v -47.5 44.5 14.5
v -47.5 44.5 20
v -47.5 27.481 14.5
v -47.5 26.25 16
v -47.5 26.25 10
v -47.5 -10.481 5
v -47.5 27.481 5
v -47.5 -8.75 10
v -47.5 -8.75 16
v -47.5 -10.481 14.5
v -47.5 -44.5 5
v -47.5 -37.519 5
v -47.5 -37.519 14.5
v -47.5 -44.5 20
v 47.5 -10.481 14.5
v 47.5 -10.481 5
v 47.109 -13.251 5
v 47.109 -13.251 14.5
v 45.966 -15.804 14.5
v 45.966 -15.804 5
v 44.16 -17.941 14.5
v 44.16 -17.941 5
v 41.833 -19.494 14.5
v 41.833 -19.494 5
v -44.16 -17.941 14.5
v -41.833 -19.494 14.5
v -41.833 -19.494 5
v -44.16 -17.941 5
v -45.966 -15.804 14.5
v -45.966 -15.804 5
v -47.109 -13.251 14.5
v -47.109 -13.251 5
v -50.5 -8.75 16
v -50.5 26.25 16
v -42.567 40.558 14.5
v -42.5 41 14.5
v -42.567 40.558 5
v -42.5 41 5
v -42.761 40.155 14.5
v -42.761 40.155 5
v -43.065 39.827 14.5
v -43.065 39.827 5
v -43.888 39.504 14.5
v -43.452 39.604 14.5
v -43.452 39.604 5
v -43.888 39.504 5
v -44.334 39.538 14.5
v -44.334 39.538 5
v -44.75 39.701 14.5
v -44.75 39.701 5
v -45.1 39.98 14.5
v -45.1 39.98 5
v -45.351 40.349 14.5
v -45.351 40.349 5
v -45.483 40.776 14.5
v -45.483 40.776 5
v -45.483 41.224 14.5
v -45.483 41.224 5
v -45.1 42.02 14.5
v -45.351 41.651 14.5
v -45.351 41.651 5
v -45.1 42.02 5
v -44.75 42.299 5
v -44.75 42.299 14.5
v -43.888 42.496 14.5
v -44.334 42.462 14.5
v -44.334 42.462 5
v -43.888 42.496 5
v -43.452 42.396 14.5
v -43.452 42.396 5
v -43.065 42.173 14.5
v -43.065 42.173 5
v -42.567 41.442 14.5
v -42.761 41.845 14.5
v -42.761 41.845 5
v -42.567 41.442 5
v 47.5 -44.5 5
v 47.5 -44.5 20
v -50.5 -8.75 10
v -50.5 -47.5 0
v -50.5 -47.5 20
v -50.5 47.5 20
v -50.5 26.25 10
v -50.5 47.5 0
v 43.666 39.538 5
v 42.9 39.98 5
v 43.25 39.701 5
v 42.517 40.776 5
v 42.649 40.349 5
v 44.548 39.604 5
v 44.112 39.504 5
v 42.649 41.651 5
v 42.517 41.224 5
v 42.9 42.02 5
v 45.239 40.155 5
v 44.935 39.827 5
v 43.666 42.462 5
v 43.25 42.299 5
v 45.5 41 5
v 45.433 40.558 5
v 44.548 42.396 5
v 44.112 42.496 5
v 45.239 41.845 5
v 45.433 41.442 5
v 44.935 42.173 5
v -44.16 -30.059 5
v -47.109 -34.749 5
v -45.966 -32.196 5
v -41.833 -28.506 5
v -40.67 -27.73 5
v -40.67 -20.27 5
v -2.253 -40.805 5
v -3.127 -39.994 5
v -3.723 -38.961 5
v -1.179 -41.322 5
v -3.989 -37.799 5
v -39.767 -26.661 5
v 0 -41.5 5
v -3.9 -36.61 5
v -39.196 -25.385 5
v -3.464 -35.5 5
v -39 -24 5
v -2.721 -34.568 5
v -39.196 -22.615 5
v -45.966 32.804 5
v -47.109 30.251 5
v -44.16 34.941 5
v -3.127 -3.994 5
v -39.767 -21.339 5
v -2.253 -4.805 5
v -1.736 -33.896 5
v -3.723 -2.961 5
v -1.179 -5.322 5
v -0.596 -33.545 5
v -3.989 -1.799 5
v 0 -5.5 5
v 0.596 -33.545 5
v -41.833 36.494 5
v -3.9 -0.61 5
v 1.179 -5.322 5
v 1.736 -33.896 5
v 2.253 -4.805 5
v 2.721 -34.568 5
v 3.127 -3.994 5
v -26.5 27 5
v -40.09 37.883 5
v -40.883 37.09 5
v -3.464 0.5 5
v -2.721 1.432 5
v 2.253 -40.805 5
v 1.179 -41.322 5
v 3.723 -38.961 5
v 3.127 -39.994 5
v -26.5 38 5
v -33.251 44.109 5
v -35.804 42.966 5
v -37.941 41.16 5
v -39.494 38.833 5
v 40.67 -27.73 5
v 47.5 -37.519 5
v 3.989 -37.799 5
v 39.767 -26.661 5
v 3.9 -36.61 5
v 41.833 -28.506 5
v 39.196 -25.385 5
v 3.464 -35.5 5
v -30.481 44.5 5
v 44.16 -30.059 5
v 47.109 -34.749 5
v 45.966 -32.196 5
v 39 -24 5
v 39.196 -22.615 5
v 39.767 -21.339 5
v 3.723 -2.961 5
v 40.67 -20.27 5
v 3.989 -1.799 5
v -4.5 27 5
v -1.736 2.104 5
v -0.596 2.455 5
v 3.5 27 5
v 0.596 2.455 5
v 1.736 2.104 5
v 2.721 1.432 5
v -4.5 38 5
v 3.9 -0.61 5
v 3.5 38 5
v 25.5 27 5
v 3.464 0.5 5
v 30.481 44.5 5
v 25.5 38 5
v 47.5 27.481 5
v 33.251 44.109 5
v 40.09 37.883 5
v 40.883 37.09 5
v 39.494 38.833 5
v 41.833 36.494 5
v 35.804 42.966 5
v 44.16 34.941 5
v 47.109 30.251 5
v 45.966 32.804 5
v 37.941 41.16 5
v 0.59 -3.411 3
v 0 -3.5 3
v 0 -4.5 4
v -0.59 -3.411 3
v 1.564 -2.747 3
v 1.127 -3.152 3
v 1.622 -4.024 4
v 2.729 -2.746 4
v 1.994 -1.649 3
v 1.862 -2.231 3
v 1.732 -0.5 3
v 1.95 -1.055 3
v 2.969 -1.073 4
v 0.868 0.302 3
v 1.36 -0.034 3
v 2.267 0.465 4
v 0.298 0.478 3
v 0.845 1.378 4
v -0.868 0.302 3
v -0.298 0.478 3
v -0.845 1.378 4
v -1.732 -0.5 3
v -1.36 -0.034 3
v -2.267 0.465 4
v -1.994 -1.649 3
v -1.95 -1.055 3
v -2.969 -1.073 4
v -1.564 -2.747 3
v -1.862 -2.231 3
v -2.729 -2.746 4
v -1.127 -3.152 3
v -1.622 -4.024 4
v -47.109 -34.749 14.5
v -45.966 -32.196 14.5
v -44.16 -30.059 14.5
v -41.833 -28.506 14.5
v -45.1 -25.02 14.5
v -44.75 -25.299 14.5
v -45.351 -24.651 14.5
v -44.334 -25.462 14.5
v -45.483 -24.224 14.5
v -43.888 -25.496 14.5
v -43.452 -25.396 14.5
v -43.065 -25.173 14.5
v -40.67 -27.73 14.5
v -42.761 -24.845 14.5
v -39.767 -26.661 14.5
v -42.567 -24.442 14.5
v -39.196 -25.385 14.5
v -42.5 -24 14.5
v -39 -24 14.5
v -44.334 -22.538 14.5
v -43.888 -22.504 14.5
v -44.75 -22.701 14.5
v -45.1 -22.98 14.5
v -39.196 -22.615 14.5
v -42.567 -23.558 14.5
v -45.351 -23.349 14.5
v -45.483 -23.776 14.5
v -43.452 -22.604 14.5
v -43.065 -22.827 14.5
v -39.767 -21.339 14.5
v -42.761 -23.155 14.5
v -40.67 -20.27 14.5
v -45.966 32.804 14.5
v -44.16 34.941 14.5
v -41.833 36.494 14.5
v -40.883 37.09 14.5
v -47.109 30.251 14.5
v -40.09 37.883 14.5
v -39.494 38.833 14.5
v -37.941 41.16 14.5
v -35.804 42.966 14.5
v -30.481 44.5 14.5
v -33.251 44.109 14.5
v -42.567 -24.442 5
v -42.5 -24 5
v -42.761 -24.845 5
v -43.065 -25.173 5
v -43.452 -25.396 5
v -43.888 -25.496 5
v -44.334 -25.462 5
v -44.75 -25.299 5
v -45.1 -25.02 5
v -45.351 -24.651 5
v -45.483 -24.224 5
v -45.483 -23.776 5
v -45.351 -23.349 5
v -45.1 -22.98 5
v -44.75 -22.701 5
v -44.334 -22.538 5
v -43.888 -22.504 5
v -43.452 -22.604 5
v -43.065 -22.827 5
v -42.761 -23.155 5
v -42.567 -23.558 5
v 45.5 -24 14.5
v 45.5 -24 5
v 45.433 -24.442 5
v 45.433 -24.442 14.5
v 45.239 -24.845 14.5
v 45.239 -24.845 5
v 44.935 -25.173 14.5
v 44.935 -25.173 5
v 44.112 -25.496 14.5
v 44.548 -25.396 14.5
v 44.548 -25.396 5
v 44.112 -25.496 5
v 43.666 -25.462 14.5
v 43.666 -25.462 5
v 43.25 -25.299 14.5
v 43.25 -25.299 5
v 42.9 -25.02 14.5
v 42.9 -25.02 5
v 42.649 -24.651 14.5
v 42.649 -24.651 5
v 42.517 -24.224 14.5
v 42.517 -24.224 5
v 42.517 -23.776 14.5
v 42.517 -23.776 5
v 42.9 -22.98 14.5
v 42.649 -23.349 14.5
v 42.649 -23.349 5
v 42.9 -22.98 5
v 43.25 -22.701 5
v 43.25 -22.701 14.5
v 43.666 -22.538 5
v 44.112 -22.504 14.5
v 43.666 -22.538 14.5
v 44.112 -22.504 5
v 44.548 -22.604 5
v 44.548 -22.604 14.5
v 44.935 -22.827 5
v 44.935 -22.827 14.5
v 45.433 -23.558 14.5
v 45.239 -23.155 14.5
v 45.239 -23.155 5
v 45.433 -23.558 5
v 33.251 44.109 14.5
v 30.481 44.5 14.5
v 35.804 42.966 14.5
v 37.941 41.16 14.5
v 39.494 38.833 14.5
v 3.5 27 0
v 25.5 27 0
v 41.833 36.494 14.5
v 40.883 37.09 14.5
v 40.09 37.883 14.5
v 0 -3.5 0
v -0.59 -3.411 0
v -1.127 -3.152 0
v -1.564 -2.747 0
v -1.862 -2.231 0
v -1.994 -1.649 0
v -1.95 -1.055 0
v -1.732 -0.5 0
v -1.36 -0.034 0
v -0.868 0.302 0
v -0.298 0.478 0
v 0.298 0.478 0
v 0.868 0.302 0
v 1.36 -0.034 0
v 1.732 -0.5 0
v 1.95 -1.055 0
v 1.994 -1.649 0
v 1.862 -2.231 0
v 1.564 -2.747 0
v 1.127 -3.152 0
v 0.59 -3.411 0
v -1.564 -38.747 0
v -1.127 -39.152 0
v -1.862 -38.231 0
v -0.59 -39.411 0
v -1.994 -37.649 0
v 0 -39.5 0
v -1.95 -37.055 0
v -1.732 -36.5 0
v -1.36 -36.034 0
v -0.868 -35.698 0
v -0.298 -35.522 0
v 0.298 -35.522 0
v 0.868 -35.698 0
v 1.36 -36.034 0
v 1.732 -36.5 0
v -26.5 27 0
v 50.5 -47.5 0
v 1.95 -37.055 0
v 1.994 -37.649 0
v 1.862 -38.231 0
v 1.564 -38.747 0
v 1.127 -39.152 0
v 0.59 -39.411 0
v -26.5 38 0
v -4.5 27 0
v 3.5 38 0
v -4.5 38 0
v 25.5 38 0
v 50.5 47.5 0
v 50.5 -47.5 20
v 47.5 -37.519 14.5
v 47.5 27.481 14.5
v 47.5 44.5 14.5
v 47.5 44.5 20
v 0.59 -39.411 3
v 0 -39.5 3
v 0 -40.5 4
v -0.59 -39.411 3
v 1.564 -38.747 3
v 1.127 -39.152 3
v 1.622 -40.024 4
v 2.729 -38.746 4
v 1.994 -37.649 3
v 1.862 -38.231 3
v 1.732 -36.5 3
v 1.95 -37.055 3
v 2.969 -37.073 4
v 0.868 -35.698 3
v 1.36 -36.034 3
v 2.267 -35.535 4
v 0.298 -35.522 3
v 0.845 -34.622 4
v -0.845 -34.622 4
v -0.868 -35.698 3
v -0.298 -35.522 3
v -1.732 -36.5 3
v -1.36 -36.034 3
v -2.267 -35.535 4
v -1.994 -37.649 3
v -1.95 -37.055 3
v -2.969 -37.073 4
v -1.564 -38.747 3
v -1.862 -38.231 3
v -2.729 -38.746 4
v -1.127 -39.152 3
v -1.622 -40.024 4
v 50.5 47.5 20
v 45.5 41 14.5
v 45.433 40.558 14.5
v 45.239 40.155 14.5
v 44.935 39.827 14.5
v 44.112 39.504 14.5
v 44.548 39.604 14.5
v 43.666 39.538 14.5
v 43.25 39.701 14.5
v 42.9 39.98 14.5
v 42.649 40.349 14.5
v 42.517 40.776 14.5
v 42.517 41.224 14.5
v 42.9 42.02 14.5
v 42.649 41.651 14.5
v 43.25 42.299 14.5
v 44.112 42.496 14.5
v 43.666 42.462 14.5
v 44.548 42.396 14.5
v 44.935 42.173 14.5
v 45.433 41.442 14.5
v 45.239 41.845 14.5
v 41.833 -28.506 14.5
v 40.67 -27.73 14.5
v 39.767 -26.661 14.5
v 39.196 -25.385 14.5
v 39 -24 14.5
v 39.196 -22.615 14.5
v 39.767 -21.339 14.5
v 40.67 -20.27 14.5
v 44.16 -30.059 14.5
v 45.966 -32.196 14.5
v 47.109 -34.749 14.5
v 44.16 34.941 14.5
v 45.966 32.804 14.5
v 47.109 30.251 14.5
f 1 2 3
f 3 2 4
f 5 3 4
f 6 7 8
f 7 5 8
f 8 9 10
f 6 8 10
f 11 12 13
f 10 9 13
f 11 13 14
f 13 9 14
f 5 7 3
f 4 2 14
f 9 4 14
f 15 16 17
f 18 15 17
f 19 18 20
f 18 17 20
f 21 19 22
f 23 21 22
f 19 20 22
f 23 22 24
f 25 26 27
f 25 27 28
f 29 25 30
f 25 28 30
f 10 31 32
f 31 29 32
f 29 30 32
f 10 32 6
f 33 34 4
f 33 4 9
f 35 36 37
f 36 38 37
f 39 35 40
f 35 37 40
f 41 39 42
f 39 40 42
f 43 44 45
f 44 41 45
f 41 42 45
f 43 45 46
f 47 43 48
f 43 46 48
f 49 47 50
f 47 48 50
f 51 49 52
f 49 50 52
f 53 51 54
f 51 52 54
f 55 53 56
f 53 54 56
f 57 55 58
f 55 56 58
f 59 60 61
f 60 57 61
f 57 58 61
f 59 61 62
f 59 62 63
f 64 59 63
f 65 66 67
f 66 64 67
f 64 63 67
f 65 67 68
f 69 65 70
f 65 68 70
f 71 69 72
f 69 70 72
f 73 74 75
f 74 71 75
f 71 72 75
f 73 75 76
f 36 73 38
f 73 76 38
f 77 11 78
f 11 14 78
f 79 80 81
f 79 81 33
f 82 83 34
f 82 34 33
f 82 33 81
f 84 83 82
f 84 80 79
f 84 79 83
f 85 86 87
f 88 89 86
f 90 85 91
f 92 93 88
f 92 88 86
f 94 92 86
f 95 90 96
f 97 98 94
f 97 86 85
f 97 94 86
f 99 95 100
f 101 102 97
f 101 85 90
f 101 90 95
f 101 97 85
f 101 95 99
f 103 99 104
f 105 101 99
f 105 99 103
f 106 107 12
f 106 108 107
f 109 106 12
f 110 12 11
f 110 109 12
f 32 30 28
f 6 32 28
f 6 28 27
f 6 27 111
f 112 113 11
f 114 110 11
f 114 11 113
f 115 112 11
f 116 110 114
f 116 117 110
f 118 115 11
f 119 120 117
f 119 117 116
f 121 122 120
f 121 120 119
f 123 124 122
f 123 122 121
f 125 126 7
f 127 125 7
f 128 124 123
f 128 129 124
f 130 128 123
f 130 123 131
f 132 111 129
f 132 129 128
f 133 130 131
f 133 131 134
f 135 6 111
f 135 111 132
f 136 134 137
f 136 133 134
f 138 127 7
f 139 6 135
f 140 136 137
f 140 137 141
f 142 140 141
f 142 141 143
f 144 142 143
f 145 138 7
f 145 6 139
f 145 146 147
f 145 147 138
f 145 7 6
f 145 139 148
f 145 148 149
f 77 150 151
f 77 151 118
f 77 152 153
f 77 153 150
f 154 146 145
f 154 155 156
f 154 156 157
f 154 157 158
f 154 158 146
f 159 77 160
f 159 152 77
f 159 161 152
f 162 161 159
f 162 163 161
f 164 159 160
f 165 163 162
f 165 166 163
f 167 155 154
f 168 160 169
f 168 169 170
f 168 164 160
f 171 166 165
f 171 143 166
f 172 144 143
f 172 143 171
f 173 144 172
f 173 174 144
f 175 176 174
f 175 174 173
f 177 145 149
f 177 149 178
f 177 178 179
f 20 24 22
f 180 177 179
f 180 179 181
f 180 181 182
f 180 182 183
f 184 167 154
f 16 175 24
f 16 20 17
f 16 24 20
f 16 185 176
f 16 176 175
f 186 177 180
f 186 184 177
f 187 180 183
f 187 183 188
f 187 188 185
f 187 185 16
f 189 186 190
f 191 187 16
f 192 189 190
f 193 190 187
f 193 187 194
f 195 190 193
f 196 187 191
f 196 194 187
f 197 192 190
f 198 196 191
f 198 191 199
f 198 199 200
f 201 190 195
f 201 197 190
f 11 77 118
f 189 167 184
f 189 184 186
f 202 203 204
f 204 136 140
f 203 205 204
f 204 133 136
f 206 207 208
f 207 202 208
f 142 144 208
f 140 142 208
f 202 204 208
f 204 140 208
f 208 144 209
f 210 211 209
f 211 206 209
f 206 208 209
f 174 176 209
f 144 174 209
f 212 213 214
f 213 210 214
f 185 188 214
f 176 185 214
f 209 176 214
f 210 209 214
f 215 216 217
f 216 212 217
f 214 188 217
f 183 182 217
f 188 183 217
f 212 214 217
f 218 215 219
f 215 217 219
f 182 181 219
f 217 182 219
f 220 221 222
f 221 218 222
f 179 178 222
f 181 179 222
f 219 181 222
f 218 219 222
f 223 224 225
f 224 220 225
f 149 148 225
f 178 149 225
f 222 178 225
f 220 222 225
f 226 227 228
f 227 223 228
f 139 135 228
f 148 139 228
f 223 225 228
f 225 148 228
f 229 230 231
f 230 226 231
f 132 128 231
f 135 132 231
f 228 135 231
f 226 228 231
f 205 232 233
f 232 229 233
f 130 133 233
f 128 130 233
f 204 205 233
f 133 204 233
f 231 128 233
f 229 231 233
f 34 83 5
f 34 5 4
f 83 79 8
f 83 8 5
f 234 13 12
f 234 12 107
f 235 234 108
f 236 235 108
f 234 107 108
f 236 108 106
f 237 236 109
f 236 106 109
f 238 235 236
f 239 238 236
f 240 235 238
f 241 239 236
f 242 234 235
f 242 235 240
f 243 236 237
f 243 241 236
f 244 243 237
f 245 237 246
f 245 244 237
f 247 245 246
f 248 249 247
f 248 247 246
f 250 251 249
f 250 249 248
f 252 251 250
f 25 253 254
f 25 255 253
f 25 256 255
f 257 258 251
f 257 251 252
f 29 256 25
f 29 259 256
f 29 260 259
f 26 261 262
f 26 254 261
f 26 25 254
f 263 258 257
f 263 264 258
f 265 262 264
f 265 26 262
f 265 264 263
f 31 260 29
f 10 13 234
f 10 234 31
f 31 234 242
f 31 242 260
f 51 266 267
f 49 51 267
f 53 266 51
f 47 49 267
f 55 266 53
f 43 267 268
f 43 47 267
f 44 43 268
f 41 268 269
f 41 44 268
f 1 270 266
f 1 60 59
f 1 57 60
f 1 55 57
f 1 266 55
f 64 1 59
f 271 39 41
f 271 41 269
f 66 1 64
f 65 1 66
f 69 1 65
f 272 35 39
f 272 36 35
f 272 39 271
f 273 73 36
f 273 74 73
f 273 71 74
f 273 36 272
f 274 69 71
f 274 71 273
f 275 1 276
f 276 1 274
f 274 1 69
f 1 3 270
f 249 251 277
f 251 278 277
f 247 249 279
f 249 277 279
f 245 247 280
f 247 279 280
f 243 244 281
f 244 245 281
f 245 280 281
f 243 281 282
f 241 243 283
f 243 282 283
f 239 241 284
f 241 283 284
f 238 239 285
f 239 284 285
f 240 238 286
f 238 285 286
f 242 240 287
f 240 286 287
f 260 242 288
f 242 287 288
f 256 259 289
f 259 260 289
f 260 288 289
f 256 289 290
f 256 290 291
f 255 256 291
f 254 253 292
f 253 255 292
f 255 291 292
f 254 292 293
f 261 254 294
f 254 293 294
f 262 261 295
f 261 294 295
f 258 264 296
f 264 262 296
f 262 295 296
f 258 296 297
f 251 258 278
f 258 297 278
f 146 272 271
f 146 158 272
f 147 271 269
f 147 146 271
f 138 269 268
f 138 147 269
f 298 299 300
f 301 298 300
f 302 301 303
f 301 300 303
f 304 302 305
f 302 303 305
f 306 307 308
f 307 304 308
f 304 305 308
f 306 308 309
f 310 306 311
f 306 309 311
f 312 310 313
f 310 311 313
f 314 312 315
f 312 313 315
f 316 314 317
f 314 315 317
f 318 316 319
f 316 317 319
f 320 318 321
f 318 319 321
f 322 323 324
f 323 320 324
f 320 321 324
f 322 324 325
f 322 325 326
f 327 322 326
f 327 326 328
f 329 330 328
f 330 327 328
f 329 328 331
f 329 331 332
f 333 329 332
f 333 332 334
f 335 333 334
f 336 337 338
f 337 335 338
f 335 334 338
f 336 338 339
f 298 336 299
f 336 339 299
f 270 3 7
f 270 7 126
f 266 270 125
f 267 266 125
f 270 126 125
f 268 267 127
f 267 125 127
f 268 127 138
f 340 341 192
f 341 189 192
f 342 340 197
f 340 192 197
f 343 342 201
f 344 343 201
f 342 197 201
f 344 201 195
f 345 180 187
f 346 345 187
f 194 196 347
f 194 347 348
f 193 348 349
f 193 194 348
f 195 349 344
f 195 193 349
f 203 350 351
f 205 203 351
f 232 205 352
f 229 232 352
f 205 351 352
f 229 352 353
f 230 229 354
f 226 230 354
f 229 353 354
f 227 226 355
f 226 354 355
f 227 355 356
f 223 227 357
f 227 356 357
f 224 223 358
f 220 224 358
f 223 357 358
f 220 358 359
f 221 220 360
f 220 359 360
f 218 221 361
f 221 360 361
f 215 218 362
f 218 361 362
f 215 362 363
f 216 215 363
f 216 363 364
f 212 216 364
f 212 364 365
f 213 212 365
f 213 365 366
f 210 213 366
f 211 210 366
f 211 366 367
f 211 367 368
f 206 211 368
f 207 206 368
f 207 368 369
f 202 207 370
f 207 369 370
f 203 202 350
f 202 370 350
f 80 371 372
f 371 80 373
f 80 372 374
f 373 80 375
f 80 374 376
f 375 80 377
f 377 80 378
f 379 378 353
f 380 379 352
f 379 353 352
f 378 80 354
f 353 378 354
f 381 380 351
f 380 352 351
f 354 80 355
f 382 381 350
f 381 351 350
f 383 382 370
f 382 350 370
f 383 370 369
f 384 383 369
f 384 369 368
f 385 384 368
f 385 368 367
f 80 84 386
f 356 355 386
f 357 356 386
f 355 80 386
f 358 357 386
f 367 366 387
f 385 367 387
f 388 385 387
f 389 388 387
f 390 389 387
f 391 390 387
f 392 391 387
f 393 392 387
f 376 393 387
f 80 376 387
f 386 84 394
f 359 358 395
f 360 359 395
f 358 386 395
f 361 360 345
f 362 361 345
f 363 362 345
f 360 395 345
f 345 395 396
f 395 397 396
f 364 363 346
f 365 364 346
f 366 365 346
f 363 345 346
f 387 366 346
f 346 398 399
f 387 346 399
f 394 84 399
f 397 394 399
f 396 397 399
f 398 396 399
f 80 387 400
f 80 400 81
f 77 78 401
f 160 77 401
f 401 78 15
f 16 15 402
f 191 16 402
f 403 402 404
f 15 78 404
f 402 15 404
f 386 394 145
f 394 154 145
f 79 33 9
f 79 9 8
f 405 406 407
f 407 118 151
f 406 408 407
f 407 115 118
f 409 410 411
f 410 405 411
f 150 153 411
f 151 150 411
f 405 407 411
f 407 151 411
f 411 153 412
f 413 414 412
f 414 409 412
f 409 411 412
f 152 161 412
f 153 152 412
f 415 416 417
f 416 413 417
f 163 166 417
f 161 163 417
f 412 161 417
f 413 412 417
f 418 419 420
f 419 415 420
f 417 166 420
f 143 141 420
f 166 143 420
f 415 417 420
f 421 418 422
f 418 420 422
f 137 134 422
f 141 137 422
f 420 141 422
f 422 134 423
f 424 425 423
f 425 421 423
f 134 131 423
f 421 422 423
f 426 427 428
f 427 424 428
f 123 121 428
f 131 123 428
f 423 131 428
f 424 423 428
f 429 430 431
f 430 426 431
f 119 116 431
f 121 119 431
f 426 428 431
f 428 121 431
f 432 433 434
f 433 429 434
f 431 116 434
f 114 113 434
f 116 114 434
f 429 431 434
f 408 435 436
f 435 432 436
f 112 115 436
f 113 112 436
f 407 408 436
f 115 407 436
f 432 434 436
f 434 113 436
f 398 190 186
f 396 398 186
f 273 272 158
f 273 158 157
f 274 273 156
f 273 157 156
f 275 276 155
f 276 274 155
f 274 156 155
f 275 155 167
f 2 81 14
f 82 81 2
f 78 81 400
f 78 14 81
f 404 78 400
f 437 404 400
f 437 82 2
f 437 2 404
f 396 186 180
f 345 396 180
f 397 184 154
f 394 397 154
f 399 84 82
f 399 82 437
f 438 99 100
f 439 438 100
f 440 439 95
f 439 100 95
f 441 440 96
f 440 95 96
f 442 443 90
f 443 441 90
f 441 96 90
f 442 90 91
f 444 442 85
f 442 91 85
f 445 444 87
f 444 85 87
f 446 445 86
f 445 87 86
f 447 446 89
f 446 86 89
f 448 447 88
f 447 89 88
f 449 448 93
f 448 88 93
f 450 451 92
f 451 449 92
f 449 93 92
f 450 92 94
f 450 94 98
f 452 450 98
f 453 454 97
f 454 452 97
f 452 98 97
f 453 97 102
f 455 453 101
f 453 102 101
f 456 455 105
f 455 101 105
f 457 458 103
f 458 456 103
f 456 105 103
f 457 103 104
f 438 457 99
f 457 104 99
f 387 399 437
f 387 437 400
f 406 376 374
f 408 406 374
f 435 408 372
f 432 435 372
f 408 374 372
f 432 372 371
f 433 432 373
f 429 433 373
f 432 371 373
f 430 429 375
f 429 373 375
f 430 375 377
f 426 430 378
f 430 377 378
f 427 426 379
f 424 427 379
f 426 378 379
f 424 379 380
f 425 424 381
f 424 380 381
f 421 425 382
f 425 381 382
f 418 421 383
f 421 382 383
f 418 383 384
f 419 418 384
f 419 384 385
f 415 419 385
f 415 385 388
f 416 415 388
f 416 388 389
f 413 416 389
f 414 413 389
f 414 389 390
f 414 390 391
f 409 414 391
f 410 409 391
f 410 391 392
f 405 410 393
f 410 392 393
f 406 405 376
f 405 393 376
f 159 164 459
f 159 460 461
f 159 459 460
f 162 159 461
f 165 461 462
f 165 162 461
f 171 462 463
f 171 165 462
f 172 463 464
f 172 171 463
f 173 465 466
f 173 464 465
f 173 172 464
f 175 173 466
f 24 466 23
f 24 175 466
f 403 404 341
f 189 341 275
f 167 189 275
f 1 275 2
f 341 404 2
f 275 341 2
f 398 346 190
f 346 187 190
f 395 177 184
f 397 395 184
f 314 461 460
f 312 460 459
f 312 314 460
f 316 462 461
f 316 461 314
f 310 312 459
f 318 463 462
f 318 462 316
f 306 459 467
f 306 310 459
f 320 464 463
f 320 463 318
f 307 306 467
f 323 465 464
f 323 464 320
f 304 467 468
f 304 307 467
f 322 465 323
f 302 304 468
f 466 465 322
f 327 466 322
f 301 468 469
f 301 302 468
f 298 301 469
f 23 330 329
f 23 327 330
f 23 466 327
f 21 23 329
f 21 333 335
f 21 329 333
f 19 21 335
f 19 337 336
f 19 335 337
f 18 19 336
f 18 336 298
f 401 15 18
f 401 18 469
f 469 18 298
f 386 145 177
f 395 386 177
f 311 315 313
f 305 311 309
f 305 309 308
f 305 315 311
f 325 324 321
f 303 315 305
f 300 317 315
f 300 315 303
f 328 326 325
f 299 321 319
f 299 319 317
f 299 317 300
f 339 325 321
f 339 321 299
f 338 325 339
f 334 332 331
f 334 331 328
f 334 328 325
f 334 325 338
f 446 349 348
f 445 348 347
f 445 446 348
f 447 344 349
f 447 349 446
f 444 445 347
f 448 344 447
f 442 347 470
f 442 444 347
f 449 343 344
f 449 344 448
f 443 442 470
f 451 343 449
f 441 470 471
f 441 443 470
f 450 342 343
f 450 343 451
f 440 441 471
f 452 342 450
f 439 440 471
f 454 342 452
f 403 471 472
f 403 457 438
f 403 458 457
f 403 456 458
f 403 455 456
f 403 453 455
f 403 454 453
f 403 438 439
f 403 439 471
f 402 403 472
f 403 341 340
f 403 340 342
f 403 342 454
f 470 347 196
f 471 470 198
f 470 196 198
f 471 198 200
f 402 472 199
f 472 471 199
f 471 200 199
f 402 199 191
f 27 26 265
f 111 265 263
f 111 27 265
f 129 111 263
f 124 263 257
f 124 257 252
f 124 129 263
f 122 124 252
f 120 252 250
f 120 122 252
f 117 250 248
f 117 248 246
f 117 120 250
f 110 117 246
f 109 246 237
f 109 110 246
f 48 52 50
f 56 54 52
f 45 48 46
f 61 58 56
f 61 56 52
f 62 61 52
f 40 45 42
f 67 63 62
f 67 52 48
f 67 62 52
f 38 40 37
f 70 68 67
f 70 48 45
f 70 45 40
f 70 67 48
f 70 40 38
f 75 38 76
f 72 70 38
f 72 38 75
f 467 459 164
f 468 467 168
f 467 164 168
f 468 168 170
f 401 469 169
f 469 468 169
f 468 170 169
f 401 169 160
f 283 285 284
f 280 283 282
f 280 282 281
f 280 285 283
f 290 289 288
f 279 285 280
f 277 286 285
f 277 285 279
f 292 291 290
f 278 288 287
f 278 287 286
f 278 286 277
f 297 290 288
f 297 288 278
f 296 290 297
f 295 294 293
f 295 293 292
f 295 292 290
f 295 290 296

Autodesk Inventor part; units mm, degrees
ref_plane "YZ Plane" through (0, 0, 0) normal (1, 0, 0) x (0, 1, 0)
ref_plane "XZ Plane" through (0, 0, 0) normal (0, 1, 0) x (-1, 0, 0)
ref_plane "XY Plane" through (0, 0, 0) normal (0, 0, 1) x (1, 0, 0)
sketch "Sketch1" plane through (0, 0, 0) normal (0, 0, 1) x (1, 0, 0)
  line L0 (-50.5, 47.5) -> (50.5, 47.5)
  line L1 (50.5, 47.5) -> (50.5, -47.5)
  line L2 (50.5, -47.5) -> (-50.5, -47.5)
  line L3 (-50.5, -47.5) -> (-50.5, 47.5)
  point P0 (0, 0)
  point P1 (0, 47.5)
  point P2 (-50.5, 0)
  dimension "d0" = 95
  dimension "d1" = 101
extrude "Extrusion1" add sketch "Sketch1" along normal blind 20
sketch "Sketch2" plane through (0, 0, 20) normal (0, 0, 1) x (1, 0, 0)
  line L0 (-50.5, 47.5) -> (-50.5, -47.5) projected
  line L1 (-50.5, -47.5) -> (50.5, -47.5) projected
  line L2 (50.5, -47.5) -> (50.5, 47.5) projected
  line L3 (50.5, 47.5) -> (-50.5, 47.5) projected
  line L4 (-47.5, 44.5) -> (-47.5, -44.5)
  line L5 (-47.5, -44.5) -> (47.5, -44.5)
  line L6 (47.5, -44.5) -> (47.5, 44.5)
  line L7 (47.5, 44.5) -> (-47.5, 44.5)
  point P0 (0, 0)
  dimension "d4" = 3
extrude "Extrusion2" cut sketch "Sketch2" against normal blind 15 contours L7 L6 L5 L4
sketch "Sketch3" plane through (0, 0, 5) normal (0, 0, 1) x (1, 0, 0)
  line L0 (-25.5, 37) -> (-5.5, 37) projected
  line L1 (-25.5, 28) -> (-25.5, 37) projected
  line L2 (-5.5, 28) -> (-25.5, 28) projected
  line L3 (-5.5, 37) -> (-5.5, 28) projected
  line L4 (4.5, 37) -> (24.5, 37) projected
  line L5 (4.5, 28) -> (4.5, 37) projected
  line L6 (24.5, 28) -> (4.5, 28) projected
  line L7 (24.5, 37) -> (24.5, 28) projected
  line L8 (-4.5, 38) -> (-26.5, 38)
  line L9 (-26.5, 38) -> (-26.5, 27)
  line L10 (-26.5, 27) -> (-4.5, 27)
  line L11 (-4.5, 27) -> (-4.5, 38)
  line L12 (25.5, 38) -> (3.5, 38)
  line L13 (3.5, 38) -> (3.5, 27)
  line L14 (3.5, 27) -> (25.5, 27)
  line L15 (25.5, 27) -> (25.5, 38)
  point P0 (0, 0)
  dimension "d7" = 1
  dimension "d8" = 1
extrude "Extrusion3" cut sketch "Sketch3" against normal through all contours L0 L3 L2 L1 | L4 L7 L6 L5 | L11 L10 L9 L8 | L15 L14 L13 L12
sketch "Sketch4" plane through (0, 0, 5) normal (0, 0, 1) x (1, 0, 0)
  circle A0 centre (-44, -24) radius 1.5 projected
  circle A1 centre (44, -24) radius 1.5 projected
  circle A2 centre (44, 41) radius 1.5 projected
  circle A3 centre (-44, 41) radius 1.5 projected
  circle A4 centre (-44, -24) radius 5
  circle A5 centre (44, -24) radius 5
  circle A6 centre (-44, 41) radius 5
  circle A7 centre (44, 41) radius 5
  point P0 (0, 0)
  dimension "d11" = 10
  dimension "d12" = 10
  dimension "d13" = 10
  dimension "d14" = 10
extrude "Extrusion4" add sketch "Sketch4" along normal blind 9.5
fillet "Fillet1" radius 10 8 edges at (-47.5, -27.5707, 9.75) (-47.5, -20.4293, 9.75) (47.5, -20.4293, 9.75) (47.5, -27.5707, 9.75) (47.5, 37.4293, 9.75) (40.4293, 44.5, 9.75) (-40.4293, 44.5, 9.75) (-47.5, 37.4293, 9.75)
sketch "Sketch7" plane through (-50.5, -47.5, 0) normal (-1, 0, 0) x (0, 0, 1)
  line L0 (10, 73.75) -> (16, 73.75)
  line L1 (16, 73.75) -> (16, 38.75)
  line L2 (16, 38.75) -> (10, 38.75)
  line L3 (10, 38.75) -> (10, 73.75)
  line L4 (20, 95) -> (20, 0) projected
  line L5 (0, 0) -> (20, 0) projected
  point P0 (0, 47.5)
  dimension "d18" = 6
  dimension "d19" = 35
  dimension "d20" = 4
  dimension "d21" = 38.75
extrude "Extrusion5" cut sketch "Sketch7" against normal up to surface (3 mm away)
sketch "Sketch9" plane through (0, 0, 5) normal (0, 0, 1) x (1, 0, 0)
  circle A0 centre (0, -1.5) radius 2.5 construction
  circle A1 centre (0, -37.5) radius 2.5 construction
  point P0 (0, 0)
hole "Hole2" at (0, -1.5, 5) at (0, -37.5, 5) direction (0, 0, -1) diameter 4 end through all countersink diameter 8 countersink angle 90
properties part number "10-06-004 carcasa spate"
